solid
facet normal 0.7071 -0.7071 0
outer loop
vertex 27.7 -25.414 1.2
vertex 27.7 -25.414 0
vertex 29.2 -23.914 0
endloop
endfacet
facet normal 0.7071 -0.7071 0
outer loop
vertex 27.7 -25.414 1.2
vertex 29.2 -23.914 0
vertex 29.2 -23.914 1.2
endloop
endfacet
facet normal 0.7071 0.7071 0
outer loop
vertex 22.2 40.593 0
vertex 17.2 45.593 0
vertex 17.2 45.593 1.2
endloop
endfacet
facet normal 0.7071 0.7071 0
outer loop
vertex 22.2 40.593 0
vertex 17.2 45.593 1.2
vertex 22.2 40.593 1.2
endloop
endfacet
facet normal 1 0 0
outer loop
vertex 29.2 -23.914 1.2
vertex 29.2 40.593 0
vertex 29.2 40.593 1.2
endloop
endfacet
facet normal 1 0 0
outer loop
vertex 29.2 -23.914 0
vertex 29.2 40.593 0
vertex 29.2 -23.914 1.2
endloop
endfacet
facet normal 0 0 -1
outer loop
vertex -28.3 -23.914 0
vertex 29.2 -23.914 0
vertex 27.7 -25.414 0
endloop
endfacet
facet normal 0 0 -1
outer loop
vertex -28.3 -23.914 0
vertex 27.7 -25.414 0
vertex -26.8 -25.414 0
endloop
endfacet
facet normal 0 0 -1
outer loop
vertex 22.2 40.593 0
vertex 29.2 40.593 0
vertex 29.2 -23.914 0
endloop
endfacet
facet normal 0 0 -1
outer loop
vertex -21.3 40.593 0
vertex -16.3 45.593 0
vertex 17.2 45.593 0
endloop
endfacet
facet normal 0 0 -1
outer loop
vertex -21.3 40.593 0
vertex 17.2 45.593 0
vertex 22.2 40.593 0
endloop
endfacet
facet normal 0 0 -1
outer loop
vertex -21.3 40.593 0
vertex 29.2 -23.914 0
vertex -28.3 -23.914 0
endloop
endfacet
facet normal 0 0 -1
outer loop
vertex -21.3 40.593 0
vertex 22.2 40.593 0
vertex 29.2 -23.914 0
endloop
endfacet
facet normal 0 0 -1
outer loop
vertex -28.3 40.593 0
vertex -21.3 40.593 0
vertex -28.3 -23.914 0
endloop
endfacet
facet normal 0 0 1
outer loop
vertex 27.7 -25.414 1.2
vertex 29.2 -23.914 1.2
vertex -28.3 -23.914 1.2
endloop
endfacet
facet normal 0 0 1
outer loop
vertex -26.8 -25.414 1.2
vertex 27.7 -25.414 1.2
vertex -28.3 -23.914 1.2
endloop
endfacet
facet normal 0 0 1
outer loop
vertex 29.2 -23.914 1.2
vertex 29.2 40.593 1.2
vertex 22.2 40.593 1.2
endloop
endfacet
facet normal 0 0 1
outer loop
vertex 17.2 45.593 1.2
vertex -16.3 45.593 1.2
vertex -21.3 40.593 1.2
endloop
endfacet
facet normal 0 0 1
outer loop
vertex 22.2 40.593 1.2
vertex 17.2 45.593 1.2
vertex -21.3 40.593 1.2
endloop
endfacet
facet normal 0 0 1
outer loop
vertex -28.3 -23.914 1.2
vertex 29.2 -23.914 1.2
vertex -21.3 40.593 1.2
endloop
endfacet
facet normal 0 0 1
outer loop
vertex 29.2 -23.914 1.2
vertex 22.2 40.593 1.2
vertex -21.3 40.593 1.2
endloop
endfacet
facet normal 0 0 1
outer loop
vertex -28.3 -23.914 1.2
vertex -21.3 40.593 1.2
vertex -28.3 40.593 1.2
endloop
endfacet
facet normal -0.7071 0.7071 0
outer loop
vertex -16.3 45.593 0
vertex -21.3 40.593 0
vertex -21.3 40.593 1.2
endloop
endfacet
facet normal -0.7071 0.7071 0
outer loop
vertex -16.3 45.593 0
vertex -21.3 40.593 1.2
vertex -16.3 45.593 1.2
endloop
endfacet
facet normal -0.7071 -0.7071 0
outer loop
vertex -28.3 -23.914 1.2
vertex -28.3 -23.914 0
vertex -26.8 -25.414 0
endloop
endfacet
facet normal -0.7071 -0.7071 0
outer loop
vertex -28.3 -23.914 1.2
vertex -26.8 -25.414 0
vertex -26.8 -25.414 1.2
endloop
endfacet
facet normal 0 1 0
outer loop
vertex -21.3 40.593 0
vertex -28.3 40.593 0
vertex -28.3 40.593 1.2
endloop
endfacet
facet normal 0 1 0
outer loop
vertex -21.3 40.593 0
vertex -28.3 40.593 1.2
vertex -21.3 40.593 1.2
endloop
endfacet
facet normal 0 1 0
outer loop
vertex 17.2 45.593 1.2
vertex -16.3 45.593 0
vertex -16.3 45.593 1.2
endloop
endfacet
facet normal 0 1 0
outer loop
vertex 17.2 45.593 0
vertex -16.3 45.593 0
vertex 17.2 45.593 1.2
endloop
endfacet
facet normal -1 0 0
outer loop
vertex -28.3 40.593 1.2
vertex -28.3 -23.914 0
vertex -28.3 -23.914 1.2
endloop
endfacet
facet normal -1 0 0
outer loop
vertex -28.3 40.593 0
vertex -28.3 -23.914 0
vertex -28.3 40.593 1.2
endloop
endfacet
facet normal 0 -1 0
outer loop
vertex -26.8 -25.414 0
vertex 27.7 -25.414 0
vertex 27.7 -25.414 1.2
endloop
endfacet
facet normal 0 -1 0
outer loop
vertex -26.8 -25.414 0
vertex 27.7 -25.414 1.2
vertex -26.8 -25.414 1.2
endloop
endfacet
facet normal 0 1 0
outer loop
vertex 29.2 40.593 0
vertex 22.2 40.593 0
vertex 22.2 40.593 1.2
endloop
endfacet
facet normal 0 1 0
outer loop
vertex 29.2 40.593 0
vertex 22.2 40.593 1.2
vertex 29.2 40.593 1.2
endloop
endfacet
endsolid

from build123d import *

# Parameters (mm, degrees)
EXTRUDE_1_DEPTH = 1.2
CHAMFER_1_SIZE  = 1.5


with BuildPart() as part:
    # 草图1 → 凸台-拉伸1 (new body)
    with BuildSketch(Plane.XY):
        Polygon((-21.299595232, 40.59338459), (-16.299595232, 45.59338459), (17.200404768, 45.59338459), (22.200404768, 40.59338459), (29.200404768, 40.59338459), (29.200404768, -25.414429895), (-28.299595232, -25.414429895), (-28.299595232, 40.59338459), align=None)
    extrude(amount=EXTRUDE_1_DEPTH)

    # 倒角1
    chamfer_1_edges = [part.edges().sort_by_distance(p)[0] for p in [
        (29.200404768, -25.414429895, 0.6),
        (-28.299595232, -25.414429895, 0.6),
    ]]
    chamfer(chamfer_1_edges, length=CHAMFER_1_SIZE)


solid = part.part
